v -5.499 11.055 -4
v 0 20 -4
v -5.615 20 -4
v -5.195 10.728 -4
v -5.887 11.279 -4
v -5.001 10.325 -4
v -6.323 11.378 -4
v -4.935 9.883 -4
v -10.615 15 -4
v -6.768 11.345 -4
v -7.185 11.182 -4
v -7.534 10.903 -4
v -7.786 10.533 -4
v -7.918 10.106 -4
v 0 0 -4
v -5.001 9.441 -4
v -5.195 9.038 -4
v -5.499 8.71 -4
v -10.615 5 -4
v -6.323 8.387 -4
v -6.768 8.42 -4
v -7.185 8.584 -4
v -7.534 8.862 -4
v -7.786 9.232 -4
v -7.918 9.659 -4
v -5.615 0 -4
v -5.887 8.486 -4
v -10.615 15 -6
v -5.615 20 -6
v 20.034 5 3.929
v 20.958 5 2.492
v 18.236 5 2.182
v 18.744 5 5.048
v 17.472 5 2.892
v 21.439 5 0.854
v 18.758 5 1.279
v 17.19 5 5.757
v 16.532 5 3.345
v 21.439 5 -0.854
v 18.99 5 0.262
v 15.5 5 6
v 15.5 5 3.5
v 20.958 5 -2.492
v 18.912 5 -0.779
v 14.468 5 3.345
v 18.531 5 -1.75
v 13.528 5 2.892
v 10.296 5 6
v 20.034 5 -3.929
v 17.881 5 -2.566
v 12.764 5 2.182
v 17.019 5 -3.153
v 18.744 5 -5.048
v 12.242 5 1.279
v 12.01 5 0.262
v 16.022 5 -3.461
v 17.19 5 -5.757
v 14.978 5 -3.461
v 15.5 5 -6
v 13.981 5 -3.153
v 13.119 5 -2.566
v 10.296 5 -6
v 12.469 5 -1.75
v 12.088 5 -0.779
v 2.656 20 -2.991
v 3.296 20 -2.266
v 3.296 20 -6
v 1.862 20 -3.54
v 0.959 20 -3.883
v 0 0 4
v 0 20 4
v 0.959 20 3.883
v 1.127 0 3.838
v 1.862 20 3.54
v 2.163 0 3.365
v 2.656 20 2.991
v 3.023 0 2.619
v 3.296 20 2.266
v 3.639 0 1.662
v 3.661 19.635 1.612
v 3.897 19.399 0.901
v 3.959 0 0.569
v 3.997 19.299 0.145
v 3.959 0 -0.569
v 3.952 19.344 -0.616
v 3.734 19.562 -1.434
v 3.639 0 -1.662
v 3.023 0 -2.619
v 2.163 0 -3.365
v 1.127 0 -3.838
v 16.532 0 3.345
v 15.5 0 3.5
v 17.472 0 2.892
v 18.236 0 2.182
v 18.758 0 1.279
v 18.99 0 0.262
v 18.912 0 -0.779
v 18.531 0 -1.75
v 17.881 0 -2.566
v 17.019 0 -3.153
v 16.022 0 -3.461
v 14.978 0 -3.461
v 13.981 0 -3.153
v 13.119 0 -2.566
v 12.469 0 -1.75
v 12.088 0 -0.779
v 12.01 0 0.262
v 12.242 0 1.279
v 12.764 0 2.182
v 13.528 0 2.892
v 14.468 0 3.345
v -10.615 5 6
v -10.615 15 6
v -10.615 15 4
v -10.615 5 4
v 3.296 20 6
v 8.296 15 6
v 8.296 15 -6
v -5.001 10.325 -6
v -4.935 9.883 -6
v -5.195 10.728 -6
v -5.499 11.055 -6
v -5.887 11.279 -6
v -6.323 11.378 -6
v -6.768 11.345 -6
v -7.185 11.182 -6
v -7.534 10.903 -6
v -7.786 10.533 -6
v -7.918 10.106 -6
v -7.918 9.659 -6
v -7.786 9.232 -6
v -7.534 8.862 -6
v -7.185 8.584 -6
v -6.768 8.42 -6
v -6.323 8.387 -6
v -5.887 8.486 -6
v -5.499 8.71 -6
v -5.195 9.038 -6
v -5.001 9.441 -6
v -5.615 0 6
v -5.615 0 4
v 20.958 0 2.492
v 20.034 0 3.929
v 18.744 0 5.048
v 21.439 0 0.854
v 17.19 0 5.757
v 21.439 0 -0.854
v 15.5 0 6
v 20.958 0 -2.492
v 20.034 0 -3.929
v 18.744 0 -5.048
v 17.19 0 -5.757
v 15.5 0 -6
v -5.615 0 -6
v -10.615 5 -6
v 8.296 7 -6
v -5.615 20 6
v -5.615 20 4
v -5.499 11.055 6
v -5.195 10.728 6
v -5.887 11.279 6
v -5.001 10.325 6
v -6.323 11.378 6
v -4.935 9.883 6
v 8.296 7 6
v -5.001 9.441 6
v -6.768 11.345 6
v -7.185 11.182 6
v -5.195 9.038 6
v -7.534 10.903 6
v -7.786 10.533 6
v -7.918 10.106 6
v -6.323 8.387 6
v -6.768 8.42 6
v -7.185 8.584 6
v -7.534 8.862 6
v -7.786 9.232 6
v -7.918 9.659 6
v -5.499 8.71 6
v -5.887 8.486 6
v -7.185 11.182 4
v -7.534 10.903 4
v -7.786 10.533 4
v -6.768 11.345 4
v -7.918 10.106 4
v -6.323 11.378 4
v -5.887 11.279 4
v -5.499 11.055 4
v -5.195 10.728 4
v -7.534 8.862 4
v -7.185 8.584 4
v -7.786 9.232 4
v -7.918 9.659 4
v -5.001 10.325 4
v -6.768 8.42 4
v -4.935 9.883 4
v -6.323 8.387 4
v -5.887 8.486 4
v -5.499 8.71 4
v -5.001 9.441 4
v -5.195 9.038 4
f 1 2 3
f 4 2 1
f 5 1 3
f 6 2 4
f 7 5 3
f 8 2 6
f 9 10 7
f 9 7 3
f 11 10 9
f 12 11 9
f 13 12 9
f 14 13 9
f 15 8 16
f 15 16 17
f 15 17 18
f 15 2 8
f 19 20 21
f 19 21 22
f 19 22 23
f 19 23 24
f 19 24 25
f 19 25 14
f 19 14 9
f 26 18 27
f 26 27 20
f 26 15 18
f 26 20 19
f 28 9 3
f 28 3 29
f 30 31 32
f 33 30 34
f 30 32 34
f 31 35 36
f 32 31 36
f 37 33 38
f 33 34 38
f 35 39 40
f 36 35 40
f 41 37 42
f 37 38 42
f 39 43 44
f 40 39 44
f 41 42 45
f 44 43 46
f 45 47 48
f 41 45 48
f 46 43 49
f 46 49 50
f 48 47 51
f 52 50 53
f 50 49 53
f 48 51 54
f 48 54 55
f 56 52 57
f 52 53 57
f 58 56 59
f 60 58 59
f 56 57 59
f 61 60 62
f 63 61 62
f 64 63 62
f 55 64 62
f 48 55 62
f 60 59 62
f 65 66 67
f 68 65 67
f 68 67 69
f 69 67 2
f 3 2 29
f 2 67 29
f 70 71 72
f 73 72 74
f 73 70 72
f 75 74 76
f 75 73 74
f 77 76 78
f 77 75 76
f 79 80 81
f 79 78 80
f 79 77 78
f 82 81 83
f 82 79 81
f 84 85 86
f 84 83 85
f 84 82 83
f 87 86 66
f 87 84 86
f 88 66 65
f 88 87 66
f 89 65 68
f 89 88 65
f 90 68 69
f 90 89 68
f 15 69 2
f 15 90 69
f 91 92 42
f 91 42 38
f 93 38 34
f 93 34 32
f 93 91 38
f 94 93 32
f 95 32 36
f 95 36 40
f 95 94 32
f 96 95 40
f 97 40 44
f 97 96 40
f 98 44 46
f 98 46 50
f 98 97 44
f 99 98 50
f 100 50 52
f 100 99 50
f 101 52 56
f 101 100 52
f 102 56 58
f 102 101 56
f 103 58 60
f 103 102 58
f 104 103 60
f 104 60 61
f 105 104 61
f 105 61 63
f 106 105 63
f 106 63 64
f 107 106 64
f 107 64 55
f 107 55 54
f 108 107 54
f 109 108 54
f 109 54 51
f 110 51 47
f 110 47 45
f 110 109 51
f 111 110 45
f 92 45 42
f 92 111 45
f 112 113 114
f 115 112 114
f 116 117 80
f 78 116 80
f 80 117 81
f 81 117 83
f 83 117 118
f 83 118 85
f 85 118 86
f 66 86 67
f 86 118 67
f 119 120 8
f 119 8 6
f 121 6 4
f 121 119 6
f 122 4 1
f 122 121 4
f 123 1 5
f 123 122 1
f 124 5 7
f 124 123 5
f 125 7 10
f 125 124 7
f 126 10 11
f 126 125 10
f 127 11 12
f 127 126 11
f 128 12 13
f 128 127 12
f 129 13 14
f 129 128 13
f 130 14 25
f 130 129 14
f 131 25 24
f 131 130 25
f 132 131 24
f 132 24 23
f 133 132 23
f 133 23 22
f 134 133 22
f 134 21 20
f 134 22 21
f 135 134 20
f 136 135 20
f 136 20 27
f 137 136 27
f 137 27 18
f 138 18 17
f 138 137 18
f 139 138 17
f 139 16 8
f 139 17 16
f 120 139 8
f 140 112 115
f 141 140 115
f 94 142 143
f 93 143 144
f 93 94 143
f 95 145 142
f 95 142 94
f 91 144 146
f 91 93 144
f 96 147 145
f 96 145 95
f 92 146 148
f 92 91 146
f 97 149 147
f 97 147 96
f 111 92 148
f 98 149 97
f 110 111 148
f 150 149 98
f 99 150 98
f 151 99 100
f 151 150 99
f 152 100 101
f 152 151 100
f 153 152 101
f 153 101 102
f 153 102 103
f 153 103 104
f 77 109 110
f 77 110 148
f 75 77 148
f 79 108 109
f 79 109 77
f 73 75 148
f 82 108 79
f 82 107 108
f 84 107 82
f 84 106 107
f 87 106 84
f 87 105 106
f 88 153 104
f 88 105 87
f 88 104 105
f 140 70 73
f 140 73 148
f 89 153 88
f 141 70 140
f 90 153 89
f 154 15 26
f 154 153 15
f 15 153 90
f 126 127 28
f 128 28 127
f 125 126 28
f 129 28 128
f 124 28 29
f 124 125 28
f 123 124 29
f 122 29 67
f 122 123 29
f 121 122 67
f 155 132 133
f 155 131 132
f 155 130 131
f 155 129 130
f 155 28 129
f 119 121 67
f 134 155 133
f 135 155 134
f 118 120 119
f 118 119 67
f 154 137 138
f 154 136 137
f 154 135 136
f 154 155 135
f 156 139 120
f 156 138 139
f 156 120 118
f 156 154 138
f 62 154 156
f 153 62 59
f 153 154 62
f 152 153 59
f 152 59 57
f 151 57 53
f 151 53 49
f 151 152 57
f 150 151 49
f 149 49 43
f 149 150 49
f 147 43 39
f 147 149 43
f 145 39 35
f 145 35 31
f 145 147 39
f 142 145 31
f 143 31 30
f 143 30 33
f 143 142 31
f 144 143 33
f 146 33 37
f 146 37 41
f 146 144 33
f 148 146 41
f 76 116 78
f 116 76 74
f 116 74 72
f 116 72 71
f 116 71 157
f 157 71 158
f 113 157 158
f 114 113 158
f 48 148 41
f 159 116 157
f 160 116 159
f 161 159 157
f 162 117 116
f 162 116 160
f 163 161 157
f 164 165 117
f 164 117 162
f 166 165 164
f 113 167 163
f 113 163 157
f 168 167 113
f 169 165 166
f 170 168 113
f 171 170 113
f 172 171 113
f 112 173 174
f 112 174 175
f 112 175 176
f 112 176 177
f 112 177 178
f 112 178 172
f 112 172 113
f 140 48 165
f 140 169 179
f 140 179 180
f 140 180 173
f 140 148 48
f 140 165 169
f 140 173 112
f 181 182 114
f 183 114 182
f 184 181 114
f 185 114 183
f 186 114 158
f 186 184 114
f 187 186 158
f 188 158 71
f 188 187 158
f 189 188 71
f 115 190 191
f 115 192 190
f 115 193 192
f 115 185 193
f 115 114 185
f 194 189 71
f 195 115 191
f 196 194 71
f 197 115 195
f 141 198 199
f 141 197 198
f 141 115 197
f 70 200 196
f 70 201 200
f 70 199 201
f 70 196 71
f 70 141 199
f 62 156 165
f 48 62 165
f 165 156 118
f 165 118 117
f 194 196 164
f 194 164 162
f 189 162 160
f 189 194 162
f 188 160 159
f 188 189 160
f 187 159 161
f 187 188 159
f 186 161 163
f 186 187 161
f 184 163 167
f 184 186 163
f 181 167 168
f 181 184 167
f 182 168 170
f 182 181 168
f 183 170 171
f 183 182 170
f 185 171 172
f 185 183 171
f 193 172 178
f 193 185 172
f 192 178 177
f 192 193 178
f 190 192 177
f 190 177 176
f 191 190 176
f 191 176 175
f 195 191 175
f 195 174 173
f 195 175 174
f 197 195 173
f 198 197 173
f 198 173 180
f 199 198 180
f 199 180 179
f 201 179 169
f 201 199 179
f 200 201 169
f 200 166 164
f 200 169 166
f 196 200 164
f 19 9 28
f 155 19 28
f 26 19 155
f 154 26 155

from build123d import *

# Parameters (mm, degrees)
SKETCH1_R               = 3.5
BOSS_EXTRUDE1_DEPTH     = 5
BOSS_EXTRUDE2_DEPTH     = 15
CHAMFER1_SIZE           = 5
CHAMFER2_SIZE           = 5
CUT_EXTRUDE1_DEPTH      = 32.721443851
CUT_EXTRUDE1_DEPTH_BACK = 32.721443851
SKETCH3_R               = 1.5
CHAMFER3_SIZE           = 2


with BuildPart() as part:
    # Sketch1 → Boss-Extrude1 (new body)
    with BuildSketch(Plane(origin=(0, 0, 0), x_dir=(1, 0, 0), z_dir=(0, 1, 0))):
        with BuildLine():
            Line((0, 6), (15.5, 6))
            ThreePointArc((15.5, 6), (21.5, 0), (15.5, -6))
            Line((15.5, -6), (-10.614590388, -6))
            Line((-10.614590388, -6), (-10.614590388, -4))
            Line((-10.614590388, -4), (0, -4))
            ThreePointArc((0, -4), (4, 0), (0, 4))
            Line((0, 4), (-10.614590388, 4))
            Line((-10.614590388, 4), (-10.614590388, 6))
            Line((-10.614590388, 6), (0, 6))
        make_face()
        with Locations(Location((15.5, 0, 0), (0, 0, 270))):
            Circle(SKETCH1_R, mode=Mode.SUBTRACT)
    extrude(amount=BOSS_EXTRUDE1_DEPTH)

    # Sketch2 → Boss-Extrude2 (add)
    with BuildSketch(Plane(origin=(0, 5, 0), x_dir=(1, 0, 0), z_dir=(0, 1, 0))):
        with BuildLine():
            Line((8.295961618, 6), (8.295961618, -6))
            Line((8.295961618, -6), (-10.614590388, -6))
            Line((-10.614590388, -6), (-10.614590388, -4))
            Line((-10.614590388, -4), (0, -4))
            ThreePointArc((0, -4), (4, 0), (0, 4))
            Line((0, 4), (-10.614590388, 4))
            Line((-10.614590388, 4), (-10.614590388, 6))
            Line((-10.614590388, 6), (8.295961618, 6))
        make_face()
    extrude(amount=BOSS_EXTRUDE2_DEPTH)

    # Chamfer1
    # the kernel refuses this chamfer: 5 mm, written as the material it takes off along each edge
    with BuildSketch(Plane(origin=(8.295961618, 20, -18.85841494), x_dir=(0.027495876610586317, -0.9996219169112968, 0), z_dir=(0, 0, 1))) as chamfer1_piece_1:
        Polygon((CHAMFER1_SIZE * 0.999621916911, -CHAMFER1_SIZE * 0.0274958766106), (-CHAMFER1_SIZE * 0.0274958766106, -CHAMFER1_SIZE * 0.999621916911), (0, 0), align=None)
    extrude(amount=37.71682988, mode=Mode.SUBTRACT)

    # Chamfer2
    chamfer2_edges = [part.edges().sort_by_distance(p)[0] for p in [
        (-10.614590388, 0, -5),
        (-10.614590388, 20, -5),
        (-10.614590388, 20, 5),
        (-10.614590388, 0, 5),
    ]]
    chamfer(chamfer2_edges, length=CHAMFER2_SIZE)

    # Sketch3 → Cut-Extrude1 (cut, two sides: drawn at the far end of the back side and taken through both)
    with BuildSketch(Plane.XY.offset(6).offset(-CUT_EXTRUDE1_DEPTH_BACK)):
        with Locations((-6.434668113, 9.88266285)):
            Circle(SKETCH3_R)
    extrude(amount=CUT_EXTRUDE1_DEPTH + CUT_EXTRUDE1_DEPTH_BACK, mode=Mode.SUBTRACT)

    # Chamfer3
    chamfer3_edges = [part.edges().sort_by_distance(p)[0] for p in [
        (8.295961618, 5, 0),
    ]]
    chamfer(chamfer3_edges, length=CHAMFER3_SIZE)


solid = part.part
